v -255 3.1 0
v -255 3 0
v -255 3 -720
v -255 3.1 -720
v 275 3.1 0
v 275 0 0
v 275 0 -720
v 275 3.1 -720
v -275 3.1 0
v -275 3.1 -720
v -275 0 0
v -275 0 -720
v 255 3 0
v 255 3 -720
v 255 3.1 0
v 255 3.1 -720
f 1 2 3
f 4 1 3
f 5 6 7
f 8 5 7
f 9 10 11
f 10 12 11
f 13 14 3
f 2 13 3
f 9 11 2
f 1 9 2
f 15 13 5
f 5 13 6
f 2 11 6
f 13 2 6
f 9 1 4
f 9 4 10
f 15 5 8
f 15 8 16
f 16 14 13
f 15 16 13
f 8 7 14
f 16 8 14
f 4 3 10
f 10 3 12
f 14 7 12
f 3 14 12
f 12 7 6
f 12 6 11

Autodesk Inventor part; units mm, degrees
ref_plane "YZ Plane" through (0, 0, 0) normal (1, 0, 0) x (0, 1, 0)
ref_plane "XZ Plane" through (0, 0, 0) normal (0, 1, 0) x (-1, 0, 0)
ref_plane "XY Plane" through (0, 0, 0) normal (0, 0, 1) x (1, 0, 0)
sketch "Sketch1" plane through (0, 0, 0) normal (0, 1, 0) x (-1, 0, 0)
  line L0 (275, 0) -> (-275, 0)
  line L1 (-275, 0) -> (-275, -720)
  line L2 (-275, -720) -> (275, -720)
  line L3 (275, -720) -> (275, 0)
  line L4 (255, 0) -> (255, -720)
  line L5 (-255, -720) -> (-255, 0)
  point P0 (0, 0)
  point P1 (0, 0)
  dimension "d0" = 550
  dimension "d1" = 720
  dimension "d4" = 20
  dimension "d5" = 20
extrude "Extrusion1" add sketch "Sketch1" along normal blind 3
extrude "Extrusion2" add sketch "Sketch1" along normal blind 3.1 contours L3 L2 L4 L0 | L5 L2 L1 L0
equation "\"d0\" = track_width"
equation "\"d4\" = curb_width"
equation "\"d5\" = curb_width"
equation "\"d2\" = track_height"
equation "\"d6\" = track_height + curb_height"
equation "\"track_width\" = 550"
equation "\"curb_width\" = 20"
equation "\"track_height\" = 3"
equation "\"curb_height\" = 0.1"
properties part number "straight"
